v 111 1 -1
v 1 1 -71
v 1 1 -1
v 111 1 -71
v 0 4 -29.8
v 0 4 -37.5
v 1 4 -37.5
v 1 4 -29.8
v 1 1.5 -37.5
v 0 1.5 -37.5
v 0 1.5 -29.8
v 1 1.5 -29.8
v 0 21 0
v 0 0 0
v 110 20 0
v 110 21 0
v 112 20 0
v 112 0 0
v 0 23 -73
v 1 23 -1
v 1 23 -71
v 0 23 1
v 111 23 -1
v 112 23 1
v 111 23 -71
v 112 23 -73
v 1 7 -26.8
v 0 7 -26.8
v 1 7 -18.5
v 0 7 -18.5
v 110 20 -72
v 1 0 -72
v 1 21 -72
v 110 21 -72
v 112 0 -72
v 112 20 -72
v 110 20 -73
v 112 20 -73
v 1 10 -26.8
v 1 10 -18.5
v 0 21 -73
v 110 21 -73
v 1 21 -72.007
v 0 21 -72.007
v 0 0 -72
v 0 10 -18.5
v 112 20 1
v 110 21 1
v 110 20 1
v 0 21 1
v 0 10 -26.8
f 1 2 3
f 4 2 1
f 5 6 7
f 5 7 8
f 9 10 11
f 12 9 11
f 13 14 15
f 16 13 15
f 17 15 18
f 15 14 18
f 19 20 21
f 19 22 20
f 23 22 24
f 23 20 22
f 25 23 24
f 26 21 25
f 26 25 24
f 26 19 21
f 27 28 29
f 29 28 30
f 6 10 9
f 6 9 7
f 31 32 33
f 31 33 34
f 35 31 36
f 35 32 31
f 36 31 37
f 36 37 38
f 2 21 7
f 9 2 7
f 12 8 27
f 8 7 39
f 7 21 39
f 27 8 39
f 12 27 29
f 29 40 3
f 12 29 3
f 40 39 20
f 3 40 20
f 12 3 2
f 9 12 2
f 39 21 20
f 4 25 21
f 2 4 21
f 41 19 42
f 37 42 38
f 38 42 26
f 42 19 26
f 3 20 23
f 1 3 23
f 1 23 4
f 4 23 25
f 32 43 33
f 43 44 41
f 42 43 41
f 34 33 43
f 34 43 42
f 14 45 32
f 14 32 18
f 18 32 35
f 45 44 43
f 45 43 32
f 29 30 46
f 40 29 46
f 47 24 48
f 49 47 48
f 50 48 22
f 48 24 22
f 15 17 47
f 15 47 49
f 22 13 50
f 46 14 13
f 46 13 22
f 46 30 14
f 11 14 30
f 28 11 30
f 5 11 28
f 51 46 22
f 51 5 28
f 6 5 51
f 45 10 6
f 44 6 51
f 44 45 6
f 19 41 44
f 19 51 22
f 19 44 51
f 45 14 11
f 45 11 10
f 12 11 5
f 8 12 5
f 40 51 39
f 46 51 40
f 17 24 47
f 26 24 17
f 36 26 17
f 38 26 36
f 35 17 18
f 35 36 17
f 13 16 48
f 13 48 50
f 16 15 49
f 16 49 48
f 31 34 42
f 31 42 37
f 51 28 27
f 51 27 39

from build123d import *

# Parameters (mm, degrees)
CROQUIS1_W              = 112
CROQUIS1_H              = 72
SALIENTE_EXTRUIR1_DEPTH = 1
SALIENTE_EXTRUIR2_DEPTH = 1
CROQUIS3_W              = 72
CROQUIS3_H              = 23
SALIENTE_EXTRUIR3_DEPTH = 1
CROQUIS4_W              = 112
CROQUIS4_H              = 23
SALIENTE_EXTRUIR4_DEPTH = 1
CROQUIS5_W              = 112
CROQUIS5_H              = 23
SALIENTE_EXTRUIR5_DEPTH = 1
CROQUIS6_W              = 7.7
CROQUIS6_H              = 2.5
CROQUIS6_W_2            = 8.3
CROQUIS6_H_2            = 3
CORTAR_EXTRUIR1_DEPTH   = 1
SALIENTE_EXTRUIR6_DEPTH = 1
SALIENTE_EXTRUIR7_DEPTH = 1


with BuildPart() as part:
    # Croquis1 → Saliente-Extruir1 (new body)
    with BuildSketch(Plane(origin=(0, 0, 0), x_dir=(1, 0, 0), z_dir=(0, 1, 0))):
        with Locations((56, 36)):
            Rectangle(CROQUIS1_W, CROQUIS1_H)
    extrude(amount=SALIENTE_EXTRUIR1_DEPTH)

    # Croquis2 → Saliente-Extruir2 (add)
    with BuildSketch(Plane.ZY):
        Polygon((0, 0), (0, 23), (-72.007399111, 23), (-72, 0), align=None)
    extrude(amount=-SALIENTE_EXTRUIR2_DEPTH)

    # Croquis3 → Saliente-Extruir3 (add)
    with BuildSketch(Plane(origin=(112, 0, 0), x_dir=(0, 0, -1), z_dir=(1, 0, 0))):
        with Locations((36, 11.5)):
            Rectangle(CROQUIS3_W, CROQUIS3_H)
    extrude(amount=-SALIENTE_EXTRUIR3_DEPTH)

    # Croquis4 → Saliente-Extruir4 (add)
    with BuildSketch(Plane.XY):
        with Locations((56, 11.5)):
            Rectangle(CROQUIS4_W, CROQUIS4_H)
    extrude(amount=-SALIENTE_EXTRUIR4_DEPTH)

    # Croquis5 → Saliente-Extruir5 (add)
    with BuildSketch(Plane(origin=(0, 0, -72), x_dir=(-1, 0, 0), z_dir=(0, 0, -1))):
        with Locations((-56, 11.5)):
            Rectangle(CROQUIS5_W, CROQUIS5_H)
    extrude(amount=-SALIENTE_EXTRUIR5_DEPTH)

    # Croquis6 → Cortar-Extruir1 (cut)
    with BuildSketch(Plane.ZY):
        with Locations((-33.65, 2.75)):
            Rectangle(CROQUIS6_W, CROQUIS6_H)
        with Locations((-22.65, 8.5)):
            Rectangle(CROQUIS6_W_2, CROQUIS6_H_2)
    extrude(amount=-CORTAR_EXTRUIR1_DEPTH, mode=Mode.SUBTRACT)

    # Croquis7 → Saliente-Extruir6 (add)
    with BuildSketch(Plane(origin=(0, 0, -72), x_dir=(-1, 0, 0), z_dir=(0, 0, -1))):
        Polygon((-112, 23), (0, 23), (0, 21), (-110, 21), (-110, 20), (-112, 20), align=None)
    extrude(amount=SALIENTE_EXTRUIR6_DEPTH)

    # Croquis8 → Saliente-Extruir7 (add)
    with BuildSketch(Plane.XY):
        Polygon((112, 23), (112, 20), (110, 20), (110, 21), (0, 21), (0, 23), align=None)
    extrude(amount=SALIENTE_EXTRUIR7_DEPTH)


solid = part.part
